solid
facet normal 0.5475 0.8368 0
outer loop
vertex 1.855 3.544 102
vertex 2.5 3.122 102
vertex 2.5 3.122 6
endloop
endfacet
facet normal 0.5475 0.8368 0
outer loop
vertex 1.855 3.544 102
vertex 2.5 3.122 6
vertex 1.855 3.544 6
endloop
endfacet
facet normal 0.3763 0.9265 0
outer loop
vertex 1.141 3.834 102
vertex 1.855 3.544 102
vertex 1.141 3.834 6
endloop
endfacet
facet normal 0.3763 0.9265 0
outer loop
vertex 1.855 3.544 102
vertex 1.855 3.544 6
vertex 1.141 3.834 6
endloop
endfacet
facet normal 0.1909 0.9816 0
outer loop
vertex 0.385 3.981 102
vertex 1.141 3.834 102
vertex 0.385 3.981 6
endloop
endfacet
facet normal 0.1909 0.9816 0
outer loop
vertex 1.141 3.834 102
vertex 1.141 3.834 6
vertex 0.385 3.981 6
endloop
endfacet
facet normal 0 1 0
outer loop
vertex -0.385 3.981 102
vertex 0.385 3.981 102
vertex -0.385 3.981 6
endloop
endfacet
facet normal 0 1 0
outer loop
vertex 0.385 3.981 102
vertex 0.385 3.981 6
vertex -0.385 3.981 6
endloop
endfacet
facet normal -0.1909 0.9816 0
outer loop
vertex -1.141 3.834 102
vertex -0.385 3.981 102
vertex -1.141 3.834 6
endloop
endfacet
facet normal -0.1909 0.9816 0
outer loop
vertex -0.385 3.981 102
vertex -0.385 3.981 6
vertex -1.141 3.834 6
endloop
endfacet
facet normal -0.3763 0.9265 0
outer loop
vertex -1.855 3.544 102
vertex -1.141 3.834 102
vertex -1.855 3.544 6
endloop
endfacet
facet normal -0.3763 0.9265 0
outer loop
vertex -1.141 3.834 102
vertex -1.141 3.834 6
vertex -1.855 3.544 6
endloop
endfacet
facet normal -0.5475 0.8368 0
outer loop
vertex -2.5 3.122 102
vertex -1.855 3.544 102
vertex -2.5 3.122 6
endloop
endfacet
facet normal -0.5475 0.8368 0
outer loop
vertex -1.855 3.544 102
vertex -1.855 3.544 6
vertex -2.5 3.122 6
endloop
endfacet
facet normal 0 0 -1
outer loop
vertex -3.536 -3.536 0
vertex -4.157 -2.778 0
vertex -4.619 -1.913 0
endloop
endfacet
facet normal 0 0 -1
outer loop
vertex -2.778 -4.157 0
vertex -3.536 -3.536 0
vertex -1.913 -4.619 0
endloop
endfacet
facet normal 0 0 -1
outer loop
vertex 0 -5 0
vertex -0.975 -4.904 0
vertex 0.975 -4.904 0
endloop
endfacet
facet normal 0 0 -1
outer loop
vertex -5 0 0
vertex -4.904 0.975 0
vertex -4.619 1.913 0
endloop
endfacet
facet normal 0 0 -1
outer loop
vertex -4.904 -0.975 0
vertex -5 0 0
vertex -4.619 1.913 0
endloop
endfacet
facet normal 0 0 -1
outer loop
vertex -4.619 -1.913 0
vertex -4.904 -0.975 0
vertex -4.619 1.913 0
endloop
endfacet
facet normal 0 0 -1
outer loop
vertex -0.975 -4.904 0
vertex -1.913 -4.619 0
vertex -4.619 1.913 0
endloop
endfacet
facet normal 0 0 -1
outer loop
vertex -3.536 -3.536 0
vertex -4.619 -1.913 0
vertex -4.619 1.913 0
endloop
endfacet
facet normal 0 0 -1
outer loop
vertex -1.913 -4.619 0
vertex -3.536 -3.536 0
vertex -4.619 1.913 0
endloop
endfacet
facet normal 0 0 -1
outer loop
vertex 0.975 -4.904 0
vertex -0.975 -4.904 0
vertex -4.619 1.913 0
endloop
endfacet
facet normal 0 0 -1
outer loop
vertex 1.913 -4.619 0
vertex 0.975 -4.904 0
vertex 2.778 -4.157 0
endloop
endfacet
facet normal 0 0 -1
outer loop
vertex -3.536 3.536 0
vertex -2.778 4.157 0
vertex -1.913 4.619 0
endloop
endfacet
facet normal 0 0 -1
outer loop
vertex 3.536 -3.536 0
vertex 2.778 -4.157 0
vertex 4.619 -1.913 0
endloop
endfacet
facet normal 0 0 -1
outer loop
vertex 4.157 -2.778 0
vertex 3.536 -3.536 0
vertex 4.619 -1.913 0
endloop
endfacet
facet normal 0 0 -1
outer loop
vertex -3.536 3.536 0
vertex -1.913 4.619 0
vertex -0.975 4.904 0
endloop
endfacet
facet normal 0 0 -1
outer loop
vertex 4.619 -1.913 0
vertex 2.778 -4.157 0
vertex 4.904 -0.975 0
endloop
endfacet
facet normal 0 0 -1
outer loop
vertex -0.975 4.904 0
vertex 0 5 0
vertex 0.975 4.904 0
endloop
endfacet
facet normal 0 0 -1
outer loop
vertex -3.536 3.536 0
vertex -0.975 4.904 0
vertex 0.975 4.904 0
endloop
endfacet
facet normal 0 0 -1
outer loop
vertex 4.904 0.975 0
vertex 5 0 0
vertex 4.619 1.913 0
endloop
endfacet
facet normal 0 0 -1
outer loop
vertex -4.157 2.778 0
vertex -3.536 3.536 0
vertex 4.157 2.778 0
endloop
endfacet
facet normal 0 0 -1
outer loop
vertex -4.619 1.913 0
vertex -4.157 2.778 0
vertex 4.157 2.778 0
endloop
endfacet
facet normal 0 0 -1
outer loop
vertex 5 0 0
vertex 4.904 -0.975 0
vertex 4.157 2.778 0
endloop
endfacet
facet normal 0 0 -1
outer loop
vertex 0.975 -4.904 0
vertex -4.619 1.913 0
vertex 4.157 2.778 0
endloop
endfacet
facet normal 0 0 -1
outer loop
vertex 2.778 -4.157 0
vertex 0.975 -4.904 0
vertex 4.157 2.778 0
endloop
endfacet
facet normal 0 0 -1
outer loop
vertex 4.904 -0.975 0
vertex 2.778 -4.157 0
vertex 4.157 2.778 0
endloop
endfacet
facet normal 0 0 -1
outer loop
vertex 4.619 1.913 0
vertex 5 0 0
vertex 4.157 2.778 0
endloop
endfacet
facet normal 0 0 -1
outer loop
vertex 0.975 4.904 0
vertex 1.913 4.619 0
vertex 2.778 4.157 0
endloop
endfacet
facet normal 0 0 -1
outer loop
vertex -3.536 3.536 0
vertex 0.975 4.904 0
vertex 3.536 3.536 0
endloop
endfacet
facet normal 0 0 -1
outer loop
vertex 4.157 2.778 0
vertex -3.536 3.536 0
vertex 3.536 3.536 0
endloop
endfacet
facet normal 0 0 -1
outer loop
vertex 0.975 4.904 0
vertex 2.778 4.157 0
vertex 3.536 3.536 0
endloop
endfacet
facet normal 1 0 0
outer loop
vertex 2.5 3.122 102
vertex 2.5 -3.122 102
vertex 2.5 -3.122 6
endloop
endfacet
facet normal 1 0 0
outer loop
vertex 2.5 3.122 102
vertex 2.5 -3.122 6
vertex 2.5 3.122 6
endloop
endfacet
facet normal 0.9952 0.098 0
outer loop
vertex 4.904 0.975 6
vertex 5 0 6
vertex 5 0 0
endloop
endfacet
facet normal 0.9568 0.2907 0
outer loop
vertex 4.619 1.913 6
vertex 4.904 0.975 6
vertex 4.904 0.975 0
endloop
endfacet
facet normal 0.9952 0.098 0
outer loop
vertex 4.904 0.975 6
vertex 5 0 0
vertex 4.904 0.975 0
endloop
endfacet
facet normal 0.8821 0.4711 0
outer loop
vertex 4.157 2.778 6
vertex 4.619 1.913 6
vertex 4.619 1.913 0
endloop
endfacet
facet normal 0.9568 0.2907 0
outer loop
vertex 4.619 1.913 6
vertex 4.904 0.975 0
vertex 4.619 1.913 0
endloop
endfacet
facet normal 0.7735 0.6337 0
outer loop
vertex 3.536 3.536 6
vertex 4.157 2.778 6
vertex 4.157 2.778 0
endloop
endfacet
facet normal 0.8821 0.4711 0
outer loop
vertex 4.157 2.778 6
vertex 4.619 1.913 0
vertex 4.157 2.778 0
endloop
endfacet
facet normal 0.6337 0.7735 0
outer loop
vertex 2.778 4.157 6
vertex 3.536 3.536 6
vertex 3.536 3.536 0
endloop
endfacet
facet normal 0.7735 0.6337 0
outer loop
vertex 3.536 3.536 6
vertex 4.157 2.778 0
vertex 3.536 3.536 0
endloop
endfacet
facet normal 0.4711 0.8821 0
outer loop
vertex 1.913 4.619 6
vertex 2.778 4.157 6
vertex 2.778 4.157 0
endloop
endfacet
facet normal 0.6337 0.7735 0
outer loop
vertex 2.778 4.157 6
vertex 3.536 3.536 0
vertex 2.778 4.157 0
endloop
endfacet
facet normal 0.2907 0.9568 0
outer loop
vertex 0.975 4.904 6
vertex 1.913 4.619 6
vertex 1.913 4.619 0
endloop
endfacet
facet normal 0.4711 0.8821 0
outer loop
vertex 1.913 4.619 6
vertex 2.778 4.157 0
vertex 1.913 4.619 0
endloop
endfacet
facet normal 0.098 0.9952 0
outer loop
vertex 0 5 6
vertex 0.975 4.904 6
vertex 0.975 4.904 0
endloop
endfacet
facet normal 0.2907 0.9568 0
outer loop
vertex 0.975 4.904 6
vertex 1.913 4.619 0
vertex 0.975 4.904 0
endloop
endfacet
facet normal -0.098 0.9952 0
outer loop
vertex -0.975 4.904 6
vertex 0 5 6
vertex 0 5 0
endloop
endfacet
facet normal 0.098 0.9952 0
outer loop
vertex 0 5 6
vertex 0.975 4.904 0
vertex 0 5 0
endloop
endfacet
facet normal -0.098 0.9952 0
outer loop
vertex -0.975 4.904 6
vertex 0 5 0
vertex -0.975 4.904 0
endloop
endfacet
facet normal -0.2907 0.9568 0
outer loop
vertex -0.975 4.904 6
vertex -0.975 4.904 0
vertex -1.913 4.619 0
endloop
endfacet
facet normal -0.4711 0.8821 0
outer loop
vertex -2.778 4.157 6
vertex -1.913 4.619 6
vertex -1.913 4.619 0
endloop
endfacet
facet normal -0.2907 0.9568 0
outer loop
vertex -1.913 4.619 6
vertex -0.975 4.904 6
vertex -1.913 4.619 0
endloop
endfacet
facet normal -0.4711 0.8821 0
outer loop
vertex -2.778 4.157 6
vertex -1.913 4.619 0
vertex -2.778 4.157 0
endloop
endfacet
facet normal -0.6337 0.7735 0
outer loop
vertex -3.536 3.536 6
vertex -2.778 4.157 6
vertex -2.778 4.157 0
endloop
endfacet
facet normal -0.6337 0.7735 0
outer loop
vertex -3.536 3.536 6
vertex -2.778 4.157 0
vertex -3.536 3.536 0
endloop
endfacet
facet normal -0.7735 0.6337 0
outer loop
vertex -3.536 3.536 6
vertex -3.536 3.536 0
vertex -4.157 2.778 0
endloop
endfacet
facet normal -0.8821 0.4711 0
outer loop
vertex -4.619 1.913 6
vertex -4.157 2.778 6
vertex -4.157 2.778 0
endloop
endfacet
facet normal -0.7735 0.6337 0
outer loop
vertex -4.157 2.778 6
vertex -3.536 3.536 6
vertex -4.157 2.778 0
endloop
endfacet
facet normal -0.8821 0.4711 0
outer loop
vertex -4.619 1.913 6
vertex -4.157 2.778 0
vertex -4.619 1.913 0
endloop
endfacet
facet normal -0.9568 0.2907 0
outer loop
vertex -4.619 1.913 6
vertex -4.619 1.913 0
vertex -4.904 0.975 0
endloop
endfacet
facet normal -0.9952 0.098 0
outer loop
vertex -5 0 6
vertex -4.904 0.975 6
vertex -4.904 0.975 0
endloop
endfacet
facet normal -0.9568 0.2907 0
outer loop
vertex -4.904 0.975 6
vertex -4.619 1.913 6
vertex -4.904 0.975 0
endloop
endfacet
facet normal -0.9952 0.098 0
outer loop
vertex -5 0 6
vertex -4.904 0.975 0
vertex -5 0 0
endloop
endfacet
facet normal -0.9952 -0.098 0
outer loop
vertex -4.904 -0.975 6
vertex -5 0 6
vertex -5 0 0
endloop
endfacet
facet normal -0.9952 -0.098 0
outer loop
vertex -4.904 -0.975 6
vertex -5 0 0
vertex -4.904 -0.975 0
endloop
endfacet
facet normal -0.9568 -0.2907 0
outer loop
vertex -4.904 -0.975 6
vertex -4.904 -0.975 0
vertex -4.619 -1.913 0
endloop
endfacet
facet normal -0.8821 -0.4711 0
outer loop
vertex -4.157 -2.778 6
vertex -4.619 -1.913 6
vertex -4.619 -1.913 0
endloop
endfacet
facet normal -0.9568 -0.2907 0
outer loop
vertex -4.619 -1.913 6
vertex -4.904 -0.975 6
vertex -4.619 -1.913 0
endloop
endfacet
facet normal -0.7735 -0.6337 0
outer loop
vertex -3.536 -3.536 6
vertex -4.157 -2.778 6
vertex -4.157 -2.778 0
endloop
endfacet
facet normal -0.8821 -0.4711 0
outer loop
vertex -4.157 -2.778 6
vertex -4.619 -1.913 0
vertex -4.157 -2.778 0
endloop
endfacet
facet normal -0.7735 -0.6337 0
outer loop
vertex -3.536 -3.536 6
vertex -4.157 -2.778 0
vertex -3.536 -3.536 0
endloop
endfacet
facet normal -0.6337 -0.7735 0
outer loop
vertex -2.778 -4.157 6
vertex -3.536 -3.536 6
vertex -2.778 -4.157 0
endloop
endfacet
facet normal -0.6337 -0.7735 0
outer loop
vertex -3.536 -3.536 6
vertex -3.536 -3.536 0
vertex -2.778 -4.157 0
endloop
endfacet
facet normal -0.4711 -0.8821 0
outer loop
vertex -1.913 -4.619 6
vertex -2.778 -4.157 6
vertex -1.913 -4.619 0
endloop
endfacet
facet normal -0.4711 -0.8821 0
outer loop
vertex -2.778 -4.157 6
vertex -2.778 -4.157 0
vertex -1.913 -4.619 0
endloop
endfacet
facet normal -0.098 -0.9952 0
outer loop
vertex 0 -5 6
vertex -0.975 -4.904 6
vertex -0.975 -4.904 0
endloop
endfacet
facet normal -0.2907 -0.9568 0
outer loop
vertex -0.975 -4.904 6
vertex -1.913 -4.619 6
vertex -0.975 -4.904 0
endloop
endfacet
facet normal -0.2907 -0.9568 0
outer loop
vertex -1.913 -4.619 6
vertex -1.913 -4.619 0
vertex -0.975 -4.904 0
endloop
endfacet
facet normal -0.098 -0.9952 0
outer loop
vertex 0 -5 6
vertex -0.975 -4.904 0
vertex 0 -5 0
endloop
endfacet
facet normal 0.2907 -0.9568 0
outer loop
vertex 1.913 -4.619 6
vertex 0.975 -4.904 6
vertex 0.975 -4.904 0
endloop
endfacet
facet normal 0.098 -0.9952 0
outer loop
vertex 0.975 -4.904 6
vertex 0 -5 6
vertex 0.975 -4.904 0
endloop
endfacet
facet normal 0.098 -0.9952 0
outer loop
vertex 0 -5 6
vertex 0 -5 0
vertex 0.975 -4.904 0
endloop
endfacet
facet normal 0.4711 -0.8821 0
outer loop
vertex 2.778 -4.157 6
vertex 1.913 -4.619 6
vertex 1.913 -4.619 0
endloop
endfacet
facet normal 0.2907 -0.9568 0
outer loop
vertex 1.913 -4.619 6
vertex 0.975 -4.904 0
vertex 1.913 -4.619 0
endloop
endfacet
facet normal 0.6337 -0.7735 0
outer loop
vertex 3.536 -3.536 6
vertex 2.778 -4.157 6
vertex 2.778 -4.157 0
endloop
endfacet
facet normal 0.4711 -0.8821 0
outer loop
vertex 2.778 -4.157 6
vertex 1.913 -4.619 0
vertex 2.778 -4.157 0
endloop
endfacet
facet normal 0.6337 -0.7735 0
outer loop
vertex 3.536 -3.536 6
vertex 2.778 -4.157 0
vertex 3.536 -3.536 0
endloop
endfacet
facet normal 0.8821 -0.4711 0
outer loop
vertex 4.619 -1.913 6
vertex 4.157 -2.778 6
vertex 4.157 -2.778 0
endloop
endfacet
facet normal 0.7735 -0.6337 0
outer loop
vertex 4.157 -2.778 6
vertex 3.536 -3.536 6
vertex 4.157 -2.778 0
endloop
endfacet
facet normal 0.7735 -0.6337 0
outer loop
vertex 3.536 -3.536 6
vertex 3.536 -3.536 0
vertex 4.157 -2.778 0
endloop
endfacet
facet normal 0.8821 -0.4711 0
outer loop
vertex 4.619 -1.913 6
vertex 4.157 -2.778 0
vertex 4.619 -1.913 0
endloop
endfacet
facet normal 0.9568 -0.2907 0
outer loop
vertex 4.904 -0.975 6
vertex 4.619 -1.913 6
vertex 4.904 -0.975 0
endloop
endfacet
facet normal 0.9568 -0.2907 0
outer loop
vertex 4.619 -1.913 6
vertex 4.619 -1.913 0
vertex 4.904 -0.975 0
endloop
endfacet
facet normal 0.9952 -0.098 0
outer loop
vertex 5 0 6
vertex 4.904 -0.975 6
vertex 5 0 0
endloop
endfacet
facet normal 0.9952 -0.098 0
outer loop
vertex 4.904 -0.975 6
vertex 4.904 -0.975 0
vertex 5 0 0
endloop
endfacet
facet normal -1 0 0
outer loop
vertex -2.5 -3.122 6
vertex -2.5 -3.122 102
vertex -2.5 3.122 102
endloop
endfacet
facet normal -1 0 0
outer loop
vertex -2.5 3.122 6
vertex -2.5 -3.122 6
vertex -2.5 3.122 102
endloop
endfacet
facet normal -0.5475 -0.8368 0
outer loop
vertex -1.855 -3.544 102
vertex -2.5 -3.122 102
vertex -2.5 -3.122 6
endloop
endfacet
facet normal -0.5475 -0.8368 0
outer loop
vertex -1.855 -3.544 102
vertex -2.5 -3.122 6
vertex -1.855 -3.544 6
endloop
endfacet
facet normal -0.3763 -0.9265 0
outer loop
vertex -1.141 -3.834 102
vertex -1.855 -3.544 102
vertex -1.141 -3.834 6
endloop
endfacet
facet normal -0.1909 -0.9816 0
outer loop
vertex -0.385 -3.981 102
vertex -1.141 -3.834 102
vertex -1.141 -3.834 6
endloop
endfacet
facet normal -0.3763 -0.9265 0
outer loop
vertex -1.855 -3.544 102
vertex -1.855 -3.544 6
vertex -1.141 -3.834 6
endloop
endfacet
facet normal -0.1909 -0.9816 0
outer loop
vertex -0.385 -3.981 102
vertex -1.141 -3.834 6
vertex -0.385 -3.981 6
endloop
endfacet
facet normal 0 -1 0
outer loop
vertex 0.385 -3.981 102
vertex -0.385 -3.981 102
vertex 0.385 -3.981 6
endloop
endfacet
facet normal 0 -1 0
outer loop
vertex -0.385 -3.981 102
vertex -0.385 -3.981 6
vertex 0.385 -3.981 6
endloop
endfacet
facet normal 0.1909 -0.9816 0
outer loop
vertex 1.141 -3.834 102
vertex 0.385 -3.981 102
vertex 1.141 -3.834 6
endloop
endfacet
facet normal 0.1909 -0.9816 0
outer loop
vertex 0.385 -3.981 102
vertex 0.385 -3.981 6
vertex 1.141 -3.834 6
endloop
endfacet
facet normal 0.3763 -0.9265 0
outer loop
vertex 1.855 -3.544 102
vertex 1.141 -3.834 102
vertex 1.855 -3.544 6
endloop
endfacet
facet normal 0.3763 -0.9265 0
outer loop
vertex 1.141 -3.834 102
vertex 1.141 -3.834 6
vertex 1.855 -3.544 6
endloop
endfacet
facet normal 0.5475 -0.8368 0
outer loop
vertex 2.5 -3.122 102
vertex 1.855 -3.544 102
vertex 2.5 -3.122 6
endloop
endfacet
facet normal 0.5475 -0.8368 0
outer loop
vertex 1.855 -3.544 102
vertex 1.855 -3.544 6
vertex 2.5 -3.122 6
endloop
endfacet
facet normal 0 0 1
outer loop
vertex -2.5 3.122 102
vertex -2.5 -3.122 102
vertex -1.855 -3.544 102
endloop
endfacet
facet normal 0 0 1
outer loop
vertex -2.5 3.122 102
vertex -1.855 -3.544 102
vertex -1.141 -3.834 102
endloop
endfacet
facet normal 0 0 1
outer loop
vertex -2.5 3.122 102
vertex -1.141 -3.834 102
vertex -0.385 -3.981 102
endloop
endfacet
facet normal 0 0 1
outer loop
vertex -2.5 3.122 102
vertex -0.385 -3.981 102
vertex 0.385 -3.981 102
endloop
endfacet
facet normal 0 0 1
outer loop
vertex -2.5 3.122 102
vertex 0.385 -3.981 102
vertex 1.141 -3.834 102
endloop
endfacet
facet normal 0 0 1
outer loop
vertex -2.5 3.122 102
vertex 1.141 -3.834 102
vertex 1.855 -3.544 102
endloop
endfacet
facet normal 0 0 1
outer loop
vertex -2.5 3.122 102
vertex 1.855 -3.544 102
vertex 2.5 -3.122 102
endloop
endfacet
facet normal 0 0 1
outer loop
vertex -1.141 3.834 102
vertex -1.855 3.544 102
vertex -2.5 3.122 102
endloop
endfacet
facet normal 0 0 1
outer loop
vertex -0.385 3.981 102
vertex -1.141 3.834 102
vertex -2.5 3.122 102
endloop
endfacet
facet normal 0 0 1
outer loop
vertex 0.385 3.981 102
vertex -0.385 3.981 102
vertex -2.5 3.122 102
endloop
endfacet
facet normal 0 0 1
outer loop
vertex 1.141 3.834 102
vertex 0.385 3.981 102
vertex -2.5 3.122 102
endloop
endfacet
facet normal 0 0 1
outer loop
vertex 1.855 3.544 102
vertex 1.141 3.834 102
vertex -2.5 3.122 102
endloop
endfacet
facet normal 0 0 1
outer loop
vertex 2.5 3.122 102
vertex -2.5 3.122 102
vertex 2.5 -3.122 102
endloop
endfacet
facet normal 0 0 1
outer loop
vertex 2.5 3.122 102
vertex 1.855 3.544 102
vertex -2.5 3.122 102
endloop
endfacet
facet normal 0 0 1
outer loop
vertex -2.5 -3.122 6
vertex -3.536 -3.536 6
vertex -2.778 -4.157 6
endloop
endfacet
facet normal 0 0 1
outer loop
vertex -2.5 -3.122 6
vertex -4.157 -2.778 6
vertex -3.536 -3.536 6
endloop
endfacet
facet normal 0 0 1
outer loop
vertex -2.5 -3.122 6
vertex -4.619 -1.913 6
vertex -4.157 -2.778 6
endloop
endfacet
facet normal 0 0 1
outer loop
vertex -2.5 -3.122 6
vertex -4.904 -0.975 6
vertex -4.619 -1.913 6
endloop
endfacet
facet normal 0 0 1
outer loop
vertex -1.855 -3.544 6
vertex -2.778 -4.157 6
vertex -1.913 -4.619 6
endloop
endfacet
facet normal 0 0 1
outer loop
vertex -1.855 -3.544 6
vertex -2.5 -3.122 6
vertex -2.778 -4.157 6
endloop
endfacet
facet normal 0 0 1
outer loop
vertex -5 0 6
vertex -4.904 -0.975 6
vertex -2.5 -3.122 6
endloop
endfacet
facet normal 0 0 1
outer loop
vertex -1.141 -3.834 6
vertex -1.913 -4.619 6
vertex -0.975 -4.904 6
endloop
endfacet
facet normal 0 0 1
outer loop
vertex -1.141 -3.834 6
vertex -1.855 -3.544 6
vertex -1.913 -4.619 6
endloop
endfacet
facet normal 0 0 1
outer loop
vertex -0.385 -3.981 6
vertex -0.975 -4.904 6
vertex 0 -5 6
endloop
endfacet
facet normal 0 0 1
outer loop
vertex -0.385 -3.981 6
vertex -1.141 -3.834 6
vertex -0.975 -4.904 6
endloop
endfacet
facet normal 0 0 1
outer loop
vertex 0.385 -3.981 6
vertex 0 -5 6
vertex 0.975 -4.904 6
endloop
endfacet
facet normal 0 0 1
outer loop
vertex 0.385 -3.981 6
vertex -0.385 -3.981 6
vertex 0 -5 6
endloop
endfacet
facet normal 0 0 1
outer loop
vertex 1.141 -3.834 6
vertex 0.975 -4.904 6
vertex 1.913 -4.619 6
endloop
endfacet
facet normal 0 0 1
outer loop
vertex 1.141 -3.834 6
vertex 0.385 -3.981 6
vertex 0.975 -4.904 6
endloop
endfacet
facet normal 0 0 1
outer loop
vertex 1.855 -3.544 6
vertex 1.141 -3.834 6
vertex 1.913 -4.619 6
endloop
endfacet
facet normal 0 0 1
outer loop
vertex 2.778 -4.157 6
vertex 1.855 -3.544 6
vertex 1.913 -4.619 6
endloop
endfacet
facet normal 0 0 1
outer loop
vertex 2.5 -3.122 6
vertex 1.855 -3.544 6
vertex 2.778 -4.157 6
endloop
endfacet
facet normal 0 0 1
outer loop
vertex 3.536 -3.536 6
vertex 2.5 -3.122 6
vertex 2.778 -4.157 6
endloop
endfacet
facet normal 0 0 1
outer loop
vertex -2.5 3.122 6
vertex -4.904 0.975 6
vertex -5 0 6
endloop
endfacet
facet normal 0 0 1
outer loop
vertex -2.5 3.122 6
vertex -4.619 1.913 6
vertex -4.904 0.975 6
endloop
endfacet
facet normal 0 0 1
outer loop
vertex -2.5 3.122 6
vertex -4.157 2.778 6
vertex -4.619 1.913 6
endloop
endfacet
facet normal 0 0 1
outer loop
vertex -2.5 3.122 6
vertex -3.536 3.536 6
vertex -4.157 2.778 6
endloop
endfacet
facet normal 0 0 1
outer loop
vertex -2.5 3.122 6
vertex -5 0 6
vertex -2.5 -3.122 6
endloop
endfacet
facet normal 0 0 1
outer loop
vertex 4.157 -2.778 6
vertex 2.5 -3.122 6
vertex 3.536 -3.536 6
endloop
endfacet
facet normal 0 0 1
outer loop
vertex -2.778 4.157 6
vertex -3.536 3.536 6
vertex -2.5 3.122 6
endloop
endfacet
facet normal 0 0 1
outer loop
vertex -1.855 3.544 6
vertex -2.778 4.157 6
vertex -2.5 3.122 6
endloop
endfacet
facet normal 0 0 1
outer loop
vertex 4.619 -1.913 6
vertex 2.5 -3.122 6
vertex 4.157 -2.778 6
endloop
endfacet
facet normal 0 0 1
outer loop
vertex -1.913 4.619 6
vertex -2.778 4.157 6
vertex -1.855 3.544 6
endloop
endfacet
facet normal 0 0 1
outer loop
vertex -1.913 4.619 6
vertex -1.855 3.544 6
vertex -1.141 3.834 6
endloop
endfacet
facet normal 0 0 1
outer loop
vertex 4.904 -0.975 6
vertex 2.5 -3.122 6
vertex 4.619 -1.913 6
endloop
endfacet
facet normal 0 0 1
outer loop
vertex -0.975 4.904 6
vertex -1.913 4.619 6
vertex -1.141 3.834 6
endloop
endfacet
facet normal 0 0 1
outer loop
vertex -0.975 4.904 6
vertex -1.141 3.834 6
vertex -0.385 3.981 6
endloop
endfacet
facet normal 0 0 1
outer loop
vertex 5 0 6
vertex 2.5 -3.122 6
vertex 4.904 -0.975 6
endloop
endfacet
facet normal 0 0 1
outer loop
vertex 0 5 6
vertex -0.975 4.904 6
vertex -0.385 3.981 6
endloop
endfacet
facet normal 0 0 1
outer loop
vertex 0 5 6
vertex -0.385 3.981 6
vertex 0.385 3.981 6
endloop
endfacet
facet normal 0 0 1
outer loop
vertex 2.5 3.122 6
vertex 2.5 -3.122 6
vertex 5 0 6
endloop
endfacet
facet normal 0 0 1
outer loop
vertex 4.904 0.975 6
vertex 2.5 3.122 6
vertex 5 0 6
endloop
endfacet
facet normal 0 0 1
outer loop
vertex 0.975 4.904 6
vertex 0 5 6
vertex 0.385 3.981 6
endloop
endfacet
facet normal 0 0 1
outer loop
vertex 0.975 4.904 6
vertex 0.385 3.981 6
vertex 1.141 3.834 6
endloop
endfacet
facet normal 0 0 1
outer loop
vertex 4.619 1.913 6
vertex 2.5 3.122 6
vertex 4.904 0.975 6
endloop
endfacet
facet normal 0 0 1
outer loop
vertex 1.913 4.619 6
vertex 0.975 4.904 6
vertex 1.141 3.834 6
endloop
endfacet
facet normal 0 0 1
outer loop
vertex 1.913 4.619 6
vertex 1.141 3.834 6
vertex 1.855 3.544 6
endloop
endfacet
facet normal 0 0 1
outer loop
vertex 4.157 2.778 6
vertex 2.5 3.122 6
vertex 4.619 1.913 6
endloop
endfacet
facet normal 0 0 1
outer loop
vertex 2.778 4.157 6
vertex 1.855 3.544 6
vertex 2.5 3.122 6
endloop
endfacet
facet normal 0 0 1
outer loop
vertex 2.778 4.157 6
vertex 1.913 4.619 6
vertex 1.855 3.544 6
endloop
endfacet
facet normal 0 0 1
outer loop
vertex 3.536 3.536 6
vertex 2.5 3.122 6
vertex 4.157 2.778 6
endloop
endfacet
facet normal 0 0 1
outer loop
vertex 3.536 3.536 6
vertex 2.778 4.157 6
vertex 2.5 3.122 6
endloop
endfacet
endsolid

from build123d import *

# Parameters (mm, degrees)
SKETCH1_R           = 5
BOSS_EXTRUDE1_DEPTH = 6
SKETCH2_R           = 4
BOSS_EXTRUDE2_DEPTH = 96
SKETCH6_OUTSIDE_W   = 32.596
SKETCH6_OUTSIDE_H   = 32.596
SKETCH6_OUTSIDE_W_2 = 5
SKETCH6_OUTSIDE_H_2 = 16.430986644
CUT_EXTRUDE1_DEPTH  = 96


with BuildPart() as part:
    # Sketch1 → Boss-Extrude1 (new body)
    with BuildSketch(Plane.XY):
        Circle(SKETCH1_R)
    extrude(amount=BOSS_EXTRUDE1_DEPTH)

    # Sketch2 → Boss-Extrude2 (add)
    with BuildSketch(Plane.XY.offset(6)):
        Circle(SKETCH2_R)
    extrude(amount=BOSS_EXTRUDE2_DEPTH)

    # Sketch6 outside → Cut-Extrude1 (cut)
    with BuildSketch(Plane.XY.offset(102)):
        Rectangle(SKETCH6_OUTSIDE_W, SKETCH6_OUTSIDE_H)
        Rectangle(SKETCH6_OUTSIDE_W_2, SKETCH6_OUTSIDE_H_2, mode=Mode.SUBTRACT)
    extrude(amount=-CUT_EXTRUDE1_DEPTH, mode=Mode.SUBTRACT)


solid = part.part
